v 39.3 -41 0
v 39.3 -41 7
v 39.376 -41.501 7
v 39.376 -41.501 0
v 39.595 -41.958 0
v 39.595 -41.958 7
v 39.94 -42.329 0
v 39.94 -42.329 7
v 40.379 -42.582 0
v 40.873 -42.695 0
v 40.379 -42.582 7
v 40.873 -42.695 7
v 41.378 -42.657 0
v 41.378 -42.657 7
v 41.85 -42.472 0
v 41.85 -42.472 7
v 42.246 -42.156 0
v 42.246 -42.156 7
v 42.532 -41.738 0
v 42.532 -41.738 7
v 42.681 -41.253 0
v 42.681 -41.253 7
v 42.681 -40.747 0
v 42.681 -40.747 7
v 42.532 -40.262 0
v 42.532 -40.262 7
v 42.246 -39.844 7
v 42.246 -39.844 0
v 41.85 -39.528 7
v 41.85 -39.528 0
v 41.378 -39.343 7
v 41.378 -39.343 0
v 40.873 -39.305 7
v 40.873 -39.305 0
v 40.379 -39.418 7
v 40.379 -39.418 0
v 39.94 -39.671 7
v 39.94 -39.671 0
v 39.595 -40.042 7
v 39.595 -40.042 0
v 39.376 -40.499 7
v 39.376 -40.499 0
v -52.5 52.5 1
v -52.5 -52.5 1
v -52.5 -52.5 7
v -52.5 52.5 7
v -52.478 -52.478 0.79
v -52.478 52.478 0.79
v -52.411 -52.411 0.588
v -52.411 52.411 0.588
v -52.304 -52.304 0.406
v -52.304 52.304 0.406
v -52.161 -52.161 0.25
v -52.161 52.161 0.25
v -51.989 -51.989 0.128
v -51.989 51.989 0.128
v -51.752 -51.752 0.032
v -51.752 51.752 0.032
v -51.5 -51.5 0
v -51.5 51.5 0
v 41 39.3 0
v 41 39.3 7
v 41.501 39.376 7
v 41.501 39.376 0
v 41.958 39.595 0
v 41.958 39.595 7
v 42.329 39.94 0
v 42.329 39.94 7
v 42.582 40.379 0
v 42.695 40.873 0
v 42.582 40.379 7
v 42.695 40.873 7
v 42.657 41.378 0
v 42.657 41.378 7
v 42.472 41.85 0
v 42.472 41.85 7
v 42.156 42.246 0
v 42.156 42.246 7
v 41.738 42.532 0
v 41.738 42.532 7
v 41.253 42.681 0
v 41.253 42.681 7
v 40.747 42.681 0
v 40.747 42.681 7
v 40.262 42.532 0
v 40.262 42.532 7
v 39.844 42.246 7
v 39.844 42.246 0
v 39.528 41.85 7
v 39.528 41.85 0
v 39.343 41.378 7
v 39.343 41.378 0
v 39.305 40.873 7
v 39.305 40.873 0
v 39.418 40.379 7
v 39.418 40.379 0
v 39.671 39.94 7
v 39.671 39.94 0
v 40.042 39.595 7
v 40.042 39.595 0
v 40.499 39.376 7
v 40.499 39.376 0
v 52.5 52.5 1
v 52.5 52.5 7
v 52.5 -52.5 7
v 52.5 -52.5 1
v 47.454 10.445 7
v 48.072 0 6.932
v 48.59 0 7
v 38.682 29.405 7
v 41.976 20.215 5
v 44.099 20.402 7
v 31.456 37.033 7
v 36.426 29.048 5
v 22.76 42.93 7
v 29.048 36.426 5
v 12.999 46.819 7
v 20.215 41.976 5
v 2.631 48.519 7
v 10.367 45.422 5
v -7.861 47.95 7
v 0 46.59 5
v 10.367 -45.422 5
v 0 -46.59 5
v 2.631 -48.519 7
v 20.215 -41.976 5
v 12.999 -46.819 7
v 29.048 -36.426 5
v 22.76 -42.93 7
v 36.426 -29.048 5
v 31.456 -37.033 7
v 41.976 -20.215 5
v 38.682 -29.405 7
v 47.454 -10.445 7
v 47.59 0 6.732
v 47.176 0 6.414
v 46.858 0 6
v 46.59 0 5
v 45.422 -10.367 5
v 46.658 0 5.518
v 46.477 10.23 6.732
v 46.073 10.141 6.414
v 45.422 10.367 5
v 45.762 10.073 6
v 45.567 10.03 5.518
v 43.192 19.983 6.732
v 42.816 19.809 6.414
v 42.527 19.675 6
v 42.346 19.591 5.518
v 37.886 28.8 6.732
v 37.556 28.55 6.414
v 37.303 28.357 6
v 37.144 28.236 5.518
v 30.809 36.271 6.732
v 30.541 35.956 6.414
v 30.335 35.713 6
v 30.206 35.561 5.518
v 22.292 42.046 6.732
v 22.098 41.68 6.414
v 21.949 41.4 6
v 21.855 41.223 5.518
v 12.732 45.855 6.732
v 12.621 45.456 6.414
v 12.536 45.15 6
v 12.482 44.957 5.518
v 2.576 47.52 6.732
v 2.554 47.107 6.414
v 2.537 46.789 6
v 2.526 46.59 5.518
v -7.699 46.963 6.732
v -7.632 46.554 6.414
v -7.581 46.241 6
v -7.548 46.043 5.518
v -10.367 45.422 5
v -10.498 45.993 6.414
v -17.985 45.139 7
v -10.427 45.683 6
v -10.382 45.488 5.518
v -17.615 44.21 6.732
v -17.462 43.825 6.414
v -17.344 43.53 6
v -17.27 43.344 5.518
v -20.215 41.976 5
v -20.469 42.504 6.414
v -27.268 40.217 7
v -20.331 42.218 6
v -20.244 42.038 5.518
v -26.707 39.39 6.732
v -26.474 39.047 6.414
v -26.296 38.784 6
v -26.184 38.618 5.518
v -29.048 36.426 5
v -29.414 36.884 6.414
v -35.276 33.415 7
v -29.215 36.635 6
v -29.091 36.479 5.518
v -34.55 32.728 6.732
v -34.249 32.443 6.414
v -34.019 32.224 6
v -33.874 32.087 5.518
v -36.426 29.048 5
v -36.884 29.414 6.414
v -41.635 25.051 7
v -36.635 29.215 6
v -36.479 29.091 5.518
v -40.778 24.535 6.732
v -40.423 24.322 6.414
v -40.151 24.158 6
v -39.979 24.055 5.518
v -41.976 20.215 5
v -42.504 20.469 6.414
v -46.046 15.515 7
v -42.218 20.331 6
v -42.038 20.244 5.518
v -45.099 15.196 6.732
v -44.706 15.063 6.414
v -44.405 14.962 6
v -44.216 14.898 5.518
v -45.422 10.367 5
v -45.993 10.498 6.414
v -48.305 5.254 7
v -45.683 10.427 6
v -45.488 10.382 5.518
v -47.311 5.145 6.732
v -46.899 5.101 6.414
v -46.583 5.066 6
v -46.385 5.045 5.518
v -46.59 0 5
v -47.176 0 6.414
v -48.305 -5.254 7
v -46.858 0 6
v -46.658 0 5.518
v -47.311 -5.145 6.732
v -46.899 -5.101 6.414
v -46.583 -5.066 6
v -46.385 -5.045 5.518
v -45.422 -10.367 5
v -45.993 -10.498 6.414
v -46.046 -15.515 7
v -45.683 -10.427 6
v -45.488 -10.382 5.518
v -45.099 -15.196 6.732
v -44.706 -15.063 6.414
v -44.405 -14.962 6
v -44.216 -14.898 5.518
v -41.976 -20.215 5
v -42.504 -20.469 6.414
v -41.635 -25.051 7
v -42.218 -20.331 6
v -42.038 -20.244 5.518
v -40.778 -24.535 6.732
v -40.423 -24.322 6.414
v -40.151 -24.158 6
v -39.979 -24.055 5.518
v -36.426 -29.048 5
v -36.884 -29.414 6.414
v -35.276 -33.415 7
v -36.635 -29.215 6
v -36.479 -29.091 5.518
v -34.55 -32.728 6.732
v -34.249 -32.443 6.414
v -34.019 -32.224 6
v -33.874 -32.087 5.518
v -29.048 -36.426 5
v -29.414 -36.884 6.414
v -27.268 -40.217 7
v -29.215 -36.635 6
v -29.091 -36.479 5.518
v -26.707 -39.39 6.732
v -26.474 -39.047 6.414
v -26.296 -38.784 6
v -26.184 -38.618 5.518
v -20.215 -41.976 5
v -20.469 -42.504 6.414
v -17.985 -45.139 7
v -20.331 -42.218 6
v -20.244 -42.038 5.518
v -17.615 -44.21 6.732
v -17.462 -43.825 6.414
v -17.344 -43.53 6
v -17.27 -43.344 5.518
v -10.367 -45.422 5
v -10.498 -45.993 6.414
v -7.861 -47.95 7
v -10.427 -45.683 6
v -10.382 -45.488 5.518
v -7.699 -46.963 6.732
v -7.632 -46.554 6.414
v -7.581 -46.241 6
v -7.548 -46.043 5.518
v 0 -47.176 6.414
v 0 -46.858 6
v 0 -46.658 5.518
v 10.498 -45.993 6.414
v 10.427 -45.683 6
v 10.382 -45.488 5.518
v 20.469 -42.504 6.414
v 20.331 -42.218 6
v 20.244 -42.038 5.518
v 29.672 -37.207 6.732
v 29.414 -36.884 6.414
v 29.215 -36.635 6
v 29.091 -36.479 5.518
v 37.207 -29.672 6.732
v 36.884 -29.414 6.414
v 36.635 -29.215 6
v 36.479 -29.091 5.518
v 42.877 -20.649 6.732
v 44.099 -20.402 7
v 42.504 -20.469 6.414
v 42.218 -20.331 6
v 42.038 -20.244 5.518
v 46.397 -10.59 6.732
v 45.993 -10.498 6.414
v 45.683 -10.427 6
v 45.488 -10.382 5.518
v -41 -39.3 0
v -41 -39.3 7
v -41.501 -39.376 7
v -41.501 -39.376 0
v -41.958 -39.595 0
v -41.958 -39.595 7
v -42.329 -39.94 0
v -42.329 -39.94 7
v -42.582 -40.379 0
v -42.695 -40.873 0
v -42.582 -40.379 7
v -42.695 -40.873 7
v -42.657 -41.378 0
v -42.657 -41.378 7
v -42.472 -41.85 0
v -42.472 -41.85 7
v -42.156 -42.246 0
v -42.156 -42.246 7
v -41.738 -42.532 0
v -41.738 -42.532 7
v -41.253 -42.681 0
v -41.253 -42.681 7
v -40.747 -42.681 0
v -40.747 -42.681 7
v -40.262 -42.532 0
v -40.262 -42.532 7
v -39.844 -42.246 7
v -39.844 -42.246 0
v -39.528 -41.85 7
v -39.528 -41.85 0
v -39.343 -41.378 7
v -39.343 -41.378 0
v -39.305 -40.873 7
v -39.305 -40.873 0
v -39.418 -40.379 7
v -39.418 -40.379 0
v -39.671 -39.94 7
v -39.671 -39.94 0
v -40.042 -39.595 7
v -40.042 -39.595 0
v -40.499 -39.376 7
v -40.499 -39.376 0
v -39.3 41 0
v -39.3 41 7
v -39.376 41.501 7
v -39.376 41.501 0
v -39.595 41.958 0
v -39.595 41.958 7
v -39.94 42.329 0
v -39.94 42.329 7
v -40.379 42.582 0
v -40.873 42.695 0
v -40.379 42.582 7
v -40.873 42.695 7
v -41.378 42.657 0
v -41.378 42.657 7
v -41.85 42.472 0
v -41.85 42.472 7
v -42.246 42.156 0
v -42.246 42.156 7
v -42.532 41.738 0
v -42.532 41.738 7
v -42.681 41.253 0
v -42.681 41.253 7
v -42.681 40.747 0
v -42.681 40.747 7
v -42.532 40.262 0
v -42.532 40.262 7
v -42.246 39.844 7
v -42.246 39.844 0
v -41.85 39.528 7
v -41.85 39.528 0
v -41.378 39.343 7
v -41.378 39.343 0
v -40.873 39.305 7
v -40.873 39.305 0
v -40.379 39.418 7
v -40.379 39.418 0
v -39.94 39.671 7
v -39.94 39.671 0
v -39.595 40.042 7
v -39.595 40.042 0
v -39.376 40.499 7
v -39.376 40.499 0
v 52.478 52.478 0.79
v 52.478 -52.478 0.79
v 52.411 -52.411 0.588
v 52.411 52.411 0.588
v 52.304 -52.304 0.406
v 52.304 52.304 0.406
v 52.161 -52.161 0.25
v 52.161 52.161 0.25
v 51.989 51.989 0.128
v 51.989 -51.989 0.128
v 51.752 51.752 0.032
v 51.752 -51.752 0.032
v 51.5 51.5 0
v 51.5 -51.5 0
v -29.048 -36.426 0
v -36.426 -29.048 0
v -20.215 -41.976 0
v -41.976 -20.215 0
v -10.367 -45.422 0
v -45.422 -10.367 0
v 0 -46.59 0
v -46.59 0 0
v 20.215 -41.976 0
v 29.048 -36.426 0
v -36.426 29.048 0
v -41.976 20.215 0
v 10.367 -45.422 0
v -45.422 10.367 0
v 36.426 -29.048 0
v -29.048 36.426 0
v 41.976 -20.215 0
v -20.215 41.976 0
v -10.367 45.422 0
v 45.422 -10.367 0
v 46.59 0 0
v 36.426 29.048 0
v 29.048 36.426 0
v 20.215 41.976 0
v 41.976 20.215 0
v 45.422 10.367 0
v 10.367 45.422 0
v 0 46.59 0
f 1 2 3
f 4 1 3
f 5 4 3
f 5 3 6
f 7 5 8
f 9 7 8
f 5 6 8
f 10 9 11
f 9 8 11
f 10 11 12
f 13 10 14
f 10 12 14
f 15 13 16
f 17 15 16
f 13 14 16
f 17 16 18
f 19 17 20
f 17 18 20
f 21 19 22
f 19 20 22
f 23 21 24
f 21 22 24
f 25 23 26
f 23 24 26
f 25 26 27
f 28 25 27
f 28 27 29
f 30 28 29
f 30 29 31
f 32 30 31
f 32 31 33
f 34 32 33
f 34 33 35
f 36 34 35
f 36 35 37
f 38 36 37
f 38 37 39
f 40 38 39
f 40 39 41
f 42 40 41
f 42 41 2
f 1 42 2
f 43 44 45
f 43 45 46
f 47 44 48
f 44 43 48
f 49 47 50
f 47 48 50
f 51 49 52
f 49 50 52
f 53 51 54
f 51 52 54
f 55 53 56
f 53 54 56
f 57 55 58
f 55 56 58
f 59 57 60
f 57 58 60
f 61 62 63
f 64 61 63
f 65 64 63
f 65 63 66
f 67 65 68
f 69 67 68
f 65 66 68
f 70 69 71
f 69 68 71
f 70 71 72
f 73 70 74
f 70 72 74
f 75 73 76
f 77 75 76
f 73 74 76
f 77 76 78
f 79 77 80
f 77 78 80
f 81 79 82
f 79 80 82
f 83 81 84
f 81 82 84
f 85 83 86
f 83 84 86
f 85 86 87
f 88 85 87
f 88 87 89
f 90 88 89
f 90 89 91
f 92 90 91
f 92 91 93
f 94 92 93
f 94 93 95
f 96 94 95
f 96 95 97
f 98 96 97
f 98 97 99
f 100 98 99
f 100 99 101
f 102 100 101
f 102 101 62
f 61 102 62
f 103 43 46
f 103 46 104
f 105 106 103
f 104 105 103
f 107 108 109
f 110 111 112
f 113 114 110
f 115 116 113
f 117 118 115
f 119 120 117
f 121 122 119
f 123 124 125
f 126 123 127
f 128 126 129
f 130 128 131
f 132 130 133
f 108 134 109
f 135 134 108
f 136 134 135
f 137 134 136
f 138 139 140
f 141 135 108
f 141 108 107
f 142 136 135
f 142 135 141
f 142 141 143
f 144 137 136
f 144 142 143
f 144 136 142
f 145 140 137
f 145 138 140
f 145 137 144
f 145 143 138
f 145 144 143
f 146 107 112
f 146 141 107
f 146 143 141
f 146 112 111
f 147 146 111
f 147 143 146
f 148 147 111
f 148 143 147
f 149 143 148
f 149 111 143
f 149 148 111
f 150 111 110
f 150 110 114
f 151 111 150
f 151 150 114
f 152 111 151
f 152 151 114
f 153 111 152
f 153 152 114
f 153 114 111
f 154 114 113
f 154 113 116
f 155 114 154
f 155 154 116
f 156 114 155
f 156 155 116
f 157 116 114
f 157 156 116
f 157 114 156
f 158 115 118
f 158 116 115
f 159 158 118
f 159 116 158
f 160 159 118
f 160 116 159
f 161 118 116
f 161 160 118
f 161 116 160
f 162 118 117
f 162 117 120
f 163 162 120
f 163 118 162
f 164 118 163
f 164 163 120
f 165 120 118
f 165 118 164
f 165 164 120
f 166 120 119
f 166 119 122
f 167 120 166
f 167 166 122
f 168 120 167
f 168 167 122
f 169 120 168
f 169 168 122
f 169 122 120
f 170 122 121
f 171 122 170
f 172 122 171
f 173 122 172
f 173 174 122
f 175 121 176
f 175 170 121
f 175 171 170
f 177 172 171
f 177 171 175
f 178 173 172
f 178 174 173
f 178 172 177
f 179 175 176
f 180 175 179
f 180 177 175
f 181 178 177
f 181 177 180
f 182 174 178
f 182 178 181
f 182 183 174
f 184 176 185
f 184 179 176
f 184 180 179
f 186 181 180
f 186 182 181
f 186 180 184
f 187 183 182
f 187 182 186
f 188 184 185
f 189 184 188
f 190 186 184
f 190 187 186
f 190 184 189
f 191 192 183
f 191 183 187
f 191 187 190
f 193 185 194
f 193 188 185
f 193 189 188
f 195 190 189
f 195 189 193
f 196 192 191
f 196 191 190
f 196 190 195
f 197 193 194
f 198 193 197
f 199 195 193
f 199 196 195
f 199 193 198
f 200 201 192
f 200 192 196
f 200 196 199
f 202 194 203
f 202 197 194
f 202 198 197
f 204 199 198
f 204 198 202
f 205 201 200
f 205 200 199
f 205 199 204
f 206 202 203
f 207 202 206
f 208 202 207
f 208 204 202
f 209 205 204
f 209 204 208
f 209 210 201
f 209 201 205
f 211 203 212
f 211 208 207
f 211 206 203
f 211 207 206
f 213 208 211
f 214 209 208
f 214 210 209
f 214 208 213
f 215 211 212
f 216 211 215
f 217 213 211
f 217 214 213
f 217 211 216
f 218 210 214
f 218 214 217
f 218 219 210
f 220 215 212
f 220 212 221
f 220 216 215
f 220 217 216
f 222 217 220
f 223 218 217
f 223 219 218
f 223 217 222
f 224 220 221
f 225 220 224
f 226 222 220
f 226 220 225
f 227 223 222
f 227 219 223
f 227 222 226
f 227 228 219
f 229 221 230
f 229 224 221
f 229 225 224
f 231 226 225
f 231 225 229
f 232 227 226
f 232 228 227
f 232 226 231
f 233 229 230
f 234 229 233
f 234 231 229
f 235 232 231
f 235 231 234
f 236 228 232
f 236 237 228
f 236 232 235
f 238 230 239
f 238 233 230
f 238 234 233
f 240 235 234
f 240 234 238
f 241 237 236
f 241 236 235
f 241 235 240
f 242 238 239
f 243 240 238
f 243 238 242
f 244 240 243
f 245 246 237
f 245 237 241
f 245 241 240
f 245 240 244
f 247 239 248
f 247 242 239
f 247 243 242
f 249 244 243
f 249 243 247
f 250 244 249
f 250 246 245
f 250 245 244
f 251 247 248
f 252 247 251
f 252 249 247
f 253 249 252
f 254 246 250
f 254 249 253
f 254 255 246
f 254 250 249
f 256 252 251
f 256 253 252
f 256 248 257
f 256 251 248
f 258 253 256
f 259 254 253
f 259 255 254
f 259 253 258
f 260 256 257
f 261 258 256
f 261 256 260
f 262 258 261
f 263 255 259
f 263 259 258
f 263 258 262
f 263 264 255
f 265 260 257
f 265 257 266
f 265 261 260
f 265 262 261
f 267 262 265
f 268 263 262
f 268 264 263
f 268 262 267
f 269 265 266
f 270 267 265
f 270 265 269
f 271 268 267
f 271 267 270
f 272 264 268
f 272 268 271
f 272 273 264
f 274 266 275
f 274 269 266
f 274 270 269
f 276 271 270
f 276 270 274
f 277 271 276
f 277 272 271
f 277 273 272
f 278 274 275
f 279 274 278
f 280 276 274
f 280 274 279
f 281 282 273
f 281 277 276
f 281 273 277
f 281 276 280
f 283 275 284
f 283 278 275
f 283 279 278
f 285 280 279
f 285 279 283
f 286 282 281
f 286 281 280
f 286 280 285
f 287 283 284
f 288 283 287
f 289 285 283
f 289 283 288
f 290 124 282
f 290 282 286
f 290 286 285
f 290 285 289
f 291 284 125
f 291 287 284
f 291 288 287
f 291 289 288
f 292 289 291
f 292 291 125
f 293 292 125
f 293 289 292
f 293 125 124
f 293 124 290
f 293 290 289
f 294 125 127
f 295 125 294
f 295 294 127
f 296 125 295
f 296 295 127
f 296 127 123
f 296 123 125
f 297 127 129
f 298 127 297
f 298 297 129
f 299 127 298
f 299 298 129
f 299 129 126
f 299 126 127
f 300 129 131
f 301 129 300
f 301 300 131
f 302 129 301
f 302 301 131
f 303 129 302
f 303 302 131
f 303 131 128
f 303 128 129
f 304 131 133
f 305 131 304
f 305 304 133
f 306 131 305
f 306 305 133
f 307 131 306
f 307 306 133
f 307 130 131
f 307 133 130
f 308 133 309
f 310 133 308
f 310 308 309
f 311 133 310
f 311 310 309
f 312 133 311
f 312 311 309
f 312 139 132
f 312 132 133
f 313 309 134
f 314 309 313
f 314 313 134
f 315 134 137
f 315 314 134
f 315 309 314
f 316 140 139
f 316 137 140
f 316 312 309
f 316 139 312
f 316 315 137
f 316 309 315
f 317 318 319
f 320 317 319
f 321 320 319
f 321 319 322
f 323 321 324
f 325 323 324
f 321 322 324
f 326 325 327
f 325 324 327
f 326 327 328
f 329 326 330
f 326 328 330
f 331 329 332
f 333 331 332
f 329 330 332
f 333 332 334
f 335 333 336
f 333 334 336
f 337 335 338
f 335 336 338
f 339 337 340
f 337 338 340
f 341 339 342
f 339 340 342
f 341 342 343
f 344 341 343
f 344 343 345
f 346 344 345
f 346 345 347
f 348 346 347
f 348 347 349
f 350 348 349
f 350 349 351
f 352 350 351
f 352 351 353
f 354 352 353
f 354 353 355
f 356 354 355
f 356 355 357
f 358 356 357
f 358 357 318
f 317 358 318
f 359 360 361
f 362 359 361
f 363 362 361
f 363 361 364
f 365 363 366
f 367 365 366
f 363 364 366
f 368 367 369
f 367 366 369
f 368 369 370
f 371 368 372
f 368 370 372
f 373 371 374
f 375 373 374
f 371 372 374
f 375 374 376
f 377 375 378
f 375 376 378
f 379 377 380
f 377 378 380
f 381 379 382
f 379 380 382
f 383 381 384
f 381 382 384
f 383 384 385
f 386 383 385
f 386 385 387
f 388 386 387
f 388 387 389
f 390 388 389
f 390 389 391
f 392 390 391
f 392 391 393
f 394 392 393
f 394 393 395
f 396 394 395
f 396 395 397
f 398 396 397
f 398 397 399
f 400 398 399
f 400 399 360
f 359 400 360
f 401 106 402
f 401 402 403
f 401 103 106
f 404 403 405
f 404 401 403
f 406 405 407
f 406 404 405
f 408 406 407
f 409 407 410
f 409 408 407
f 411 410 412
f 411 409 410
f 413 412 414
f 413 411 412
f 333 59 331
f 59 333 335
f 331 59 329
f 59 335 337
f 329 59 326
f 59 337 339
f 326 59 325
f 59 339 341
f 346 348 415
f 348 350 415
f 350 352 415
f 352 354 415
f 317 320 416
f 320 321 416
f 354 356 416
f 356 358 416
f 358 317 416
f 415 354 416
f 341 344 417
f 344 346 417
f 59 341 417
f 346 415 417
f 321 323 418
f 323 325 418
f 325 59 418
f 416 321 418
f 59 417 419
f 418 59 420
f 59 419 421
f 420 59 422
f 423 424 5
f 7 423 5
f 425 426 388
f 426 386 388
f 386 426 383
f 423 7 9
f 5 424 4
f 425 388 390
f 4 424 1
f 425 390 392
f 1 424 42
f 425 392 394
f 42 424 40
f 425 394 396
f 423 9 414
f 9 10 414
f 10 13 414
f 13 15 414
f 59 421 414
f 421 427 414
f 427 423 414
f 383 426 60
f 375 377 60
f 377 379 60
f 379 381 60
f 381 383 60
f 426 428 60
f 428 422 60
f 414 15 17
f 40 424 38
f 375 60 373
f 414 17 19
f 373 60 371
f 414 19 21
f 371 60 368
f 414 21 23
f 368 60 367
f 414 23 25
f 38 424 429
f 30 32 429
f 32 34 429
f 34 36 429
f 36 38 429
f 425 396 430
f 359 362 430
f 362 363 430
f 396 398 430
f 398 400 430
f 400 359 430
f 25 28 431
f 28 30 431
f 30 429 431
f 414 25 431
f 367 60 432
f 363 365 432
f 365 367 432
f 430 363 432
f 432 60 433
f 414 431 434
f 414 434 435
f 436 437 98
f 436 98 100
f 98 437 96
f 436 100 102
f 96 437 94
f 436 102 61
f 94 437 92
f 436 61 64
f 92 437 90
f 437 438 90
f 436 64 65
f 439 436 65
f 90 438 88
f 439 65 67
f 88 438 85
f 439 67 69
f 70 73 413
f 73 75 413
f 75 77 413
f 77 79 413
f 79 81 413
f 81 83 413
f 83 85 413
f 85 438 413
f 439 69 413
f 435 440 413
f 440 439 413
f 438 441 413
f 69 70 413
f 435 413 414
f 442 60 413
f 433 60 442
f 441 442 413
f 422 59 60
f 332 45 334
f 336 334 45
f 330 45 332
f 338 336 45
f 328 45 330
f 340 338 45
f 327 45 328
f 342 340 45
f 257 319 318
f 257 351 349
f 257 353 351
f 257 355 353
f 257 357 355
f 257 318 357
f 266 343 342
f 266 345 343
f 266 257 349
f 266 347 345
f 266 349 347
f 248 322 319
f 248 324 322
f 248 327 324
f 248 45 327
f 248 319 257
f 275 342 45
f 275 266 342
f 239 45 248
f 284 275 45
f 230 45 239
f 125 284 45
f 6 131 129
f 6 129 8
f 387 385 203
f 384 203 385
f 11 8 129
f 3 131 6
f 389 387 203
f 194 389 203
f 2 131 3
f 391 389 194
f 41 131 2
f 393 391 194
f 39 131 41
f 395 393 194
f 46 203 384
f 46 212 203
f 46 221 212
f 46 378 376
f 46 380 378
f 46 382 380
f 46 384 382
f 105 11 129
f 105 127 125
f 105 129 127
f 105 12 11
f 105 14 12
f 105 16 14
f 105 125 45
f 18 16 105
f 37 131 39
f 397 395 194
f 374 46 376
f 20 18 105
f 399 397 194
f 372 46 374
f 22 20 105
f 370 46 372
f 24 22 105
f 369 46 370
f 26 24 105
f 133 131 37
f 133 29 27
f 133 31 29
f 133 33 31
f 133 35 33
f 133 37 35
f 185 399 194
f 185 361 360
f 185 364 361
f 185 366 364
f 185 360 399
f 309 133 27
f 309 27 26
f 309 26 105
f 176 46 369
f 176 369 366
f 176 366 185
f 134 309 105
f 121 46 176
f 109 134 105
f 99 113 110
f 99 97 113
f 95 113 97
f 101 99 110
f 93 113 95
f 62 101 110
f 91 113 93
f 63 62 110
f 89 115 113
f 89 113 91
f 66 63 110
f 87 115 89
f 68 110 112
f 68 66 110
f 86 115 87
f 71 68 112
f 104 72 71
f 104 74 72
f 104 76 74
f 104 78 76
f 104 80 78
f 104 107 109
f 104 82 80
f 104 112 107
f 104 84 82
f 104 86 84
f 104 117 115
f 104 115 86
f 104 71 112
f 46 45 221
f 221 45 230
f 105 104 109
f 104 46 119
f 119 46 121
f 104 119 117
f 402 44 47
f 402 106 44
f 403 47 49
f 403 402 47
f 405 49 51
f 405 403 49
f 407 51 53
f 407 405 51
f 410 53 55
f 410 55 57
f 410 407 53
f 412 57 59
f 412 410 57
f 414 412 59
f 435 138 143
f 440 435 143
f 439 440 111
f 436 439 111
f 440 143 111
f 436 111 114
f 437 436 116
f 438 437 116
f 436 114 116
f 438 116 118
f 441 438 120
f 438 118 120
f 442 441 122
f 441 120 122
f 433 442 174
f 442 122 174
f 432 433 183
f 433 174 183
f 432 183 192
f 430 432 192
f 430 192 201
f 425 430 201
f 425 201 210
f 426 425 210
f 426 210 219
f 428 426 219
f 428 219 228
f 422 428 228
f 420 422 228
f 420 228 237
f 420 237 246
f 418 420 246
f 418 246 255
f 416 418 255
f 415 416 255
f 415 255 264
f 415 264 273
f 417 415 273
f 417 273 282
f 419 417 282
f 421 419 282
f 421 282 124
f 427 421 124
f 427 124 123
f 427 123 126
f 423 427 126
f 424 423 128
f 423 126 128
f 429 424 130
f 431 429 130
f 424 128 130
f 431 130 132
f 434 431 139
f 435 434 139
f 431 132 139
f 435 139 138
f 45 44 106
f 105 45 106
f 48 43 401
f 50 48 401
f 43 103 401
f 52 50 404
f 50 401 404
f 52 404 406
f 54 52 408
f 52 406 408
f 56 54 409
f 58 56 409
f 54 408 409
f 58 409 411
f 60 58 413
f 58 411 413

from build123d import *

# Parameters (mm, degrees)
SKETCH_W           = 105
SKETCH_H           = 105
PAD_DEPTH          = 7
SKETCH002_R        = 1.7
POCKET_DEPTH       = 9
POLARPATTERN_COUNT = 4
SKETCH001_R        = 46.59
POCKET001_DEPTH    = 8
FILLET_R           = 2
FILLET001_R        = 1


with BuildPart() as part:
    # Sketch → Pad (new body)
    with BuildSketch(Plane.XY):
        Rectangle(SKETCH_W, SKETCH_H)
    extrude(amount=PAD_DEPTH)

    # Sketch002 (on Face6 of Pad) → Pocket (cut)
    with BuildSketch(Plane.XY.offset(7)):
        with Locations((-41, 41)):
            Circle(SKETCH002_R)
    pocket = extrude(amount=-POCKET_DEPTH, mode=Mode.SUBTRACT)

    # PolarPattern: Pocket ×4 about axis
    polarpattern_axis = Axis((0, 0, 7), (0, 0, 1))
    for i in range(1, POLARPATTERN_COUNT):
        add(pocket.rotate(polarpattern_axis, i * 360 / POLARPATTERN_COUNT), mode=Mode.SUBTRACT)

    # Sketch001 (on Face6 of Pad) → Pocket001 (cut)
    with BuildSketch(Plane.XY.offset(7)):
        Circle(SKETCH001_R)
    extrude(amount=-POCKET001_DEPTH, mode=Mode.SUBTRACT)

    # Fillet
    fillet_edges = [part.edges().sort_by_distance(p)[0] for p in [
        (-46.59, 0, 7),
    ]]
    fillet(fillet_edges, radius=FILLET_R)

    # Fillet001
    fillet001_edges = [part.edges().sort_by_distance(p)[0] for p in [
        (52.5, 0, 0),
        (-52.5, 0, 0),
        (0, -52.5, 0),
        (0, 52.5, 0),
    ]]
    fillet(fillet001_edges, radius=FILLET001_R)


solid = part.part
